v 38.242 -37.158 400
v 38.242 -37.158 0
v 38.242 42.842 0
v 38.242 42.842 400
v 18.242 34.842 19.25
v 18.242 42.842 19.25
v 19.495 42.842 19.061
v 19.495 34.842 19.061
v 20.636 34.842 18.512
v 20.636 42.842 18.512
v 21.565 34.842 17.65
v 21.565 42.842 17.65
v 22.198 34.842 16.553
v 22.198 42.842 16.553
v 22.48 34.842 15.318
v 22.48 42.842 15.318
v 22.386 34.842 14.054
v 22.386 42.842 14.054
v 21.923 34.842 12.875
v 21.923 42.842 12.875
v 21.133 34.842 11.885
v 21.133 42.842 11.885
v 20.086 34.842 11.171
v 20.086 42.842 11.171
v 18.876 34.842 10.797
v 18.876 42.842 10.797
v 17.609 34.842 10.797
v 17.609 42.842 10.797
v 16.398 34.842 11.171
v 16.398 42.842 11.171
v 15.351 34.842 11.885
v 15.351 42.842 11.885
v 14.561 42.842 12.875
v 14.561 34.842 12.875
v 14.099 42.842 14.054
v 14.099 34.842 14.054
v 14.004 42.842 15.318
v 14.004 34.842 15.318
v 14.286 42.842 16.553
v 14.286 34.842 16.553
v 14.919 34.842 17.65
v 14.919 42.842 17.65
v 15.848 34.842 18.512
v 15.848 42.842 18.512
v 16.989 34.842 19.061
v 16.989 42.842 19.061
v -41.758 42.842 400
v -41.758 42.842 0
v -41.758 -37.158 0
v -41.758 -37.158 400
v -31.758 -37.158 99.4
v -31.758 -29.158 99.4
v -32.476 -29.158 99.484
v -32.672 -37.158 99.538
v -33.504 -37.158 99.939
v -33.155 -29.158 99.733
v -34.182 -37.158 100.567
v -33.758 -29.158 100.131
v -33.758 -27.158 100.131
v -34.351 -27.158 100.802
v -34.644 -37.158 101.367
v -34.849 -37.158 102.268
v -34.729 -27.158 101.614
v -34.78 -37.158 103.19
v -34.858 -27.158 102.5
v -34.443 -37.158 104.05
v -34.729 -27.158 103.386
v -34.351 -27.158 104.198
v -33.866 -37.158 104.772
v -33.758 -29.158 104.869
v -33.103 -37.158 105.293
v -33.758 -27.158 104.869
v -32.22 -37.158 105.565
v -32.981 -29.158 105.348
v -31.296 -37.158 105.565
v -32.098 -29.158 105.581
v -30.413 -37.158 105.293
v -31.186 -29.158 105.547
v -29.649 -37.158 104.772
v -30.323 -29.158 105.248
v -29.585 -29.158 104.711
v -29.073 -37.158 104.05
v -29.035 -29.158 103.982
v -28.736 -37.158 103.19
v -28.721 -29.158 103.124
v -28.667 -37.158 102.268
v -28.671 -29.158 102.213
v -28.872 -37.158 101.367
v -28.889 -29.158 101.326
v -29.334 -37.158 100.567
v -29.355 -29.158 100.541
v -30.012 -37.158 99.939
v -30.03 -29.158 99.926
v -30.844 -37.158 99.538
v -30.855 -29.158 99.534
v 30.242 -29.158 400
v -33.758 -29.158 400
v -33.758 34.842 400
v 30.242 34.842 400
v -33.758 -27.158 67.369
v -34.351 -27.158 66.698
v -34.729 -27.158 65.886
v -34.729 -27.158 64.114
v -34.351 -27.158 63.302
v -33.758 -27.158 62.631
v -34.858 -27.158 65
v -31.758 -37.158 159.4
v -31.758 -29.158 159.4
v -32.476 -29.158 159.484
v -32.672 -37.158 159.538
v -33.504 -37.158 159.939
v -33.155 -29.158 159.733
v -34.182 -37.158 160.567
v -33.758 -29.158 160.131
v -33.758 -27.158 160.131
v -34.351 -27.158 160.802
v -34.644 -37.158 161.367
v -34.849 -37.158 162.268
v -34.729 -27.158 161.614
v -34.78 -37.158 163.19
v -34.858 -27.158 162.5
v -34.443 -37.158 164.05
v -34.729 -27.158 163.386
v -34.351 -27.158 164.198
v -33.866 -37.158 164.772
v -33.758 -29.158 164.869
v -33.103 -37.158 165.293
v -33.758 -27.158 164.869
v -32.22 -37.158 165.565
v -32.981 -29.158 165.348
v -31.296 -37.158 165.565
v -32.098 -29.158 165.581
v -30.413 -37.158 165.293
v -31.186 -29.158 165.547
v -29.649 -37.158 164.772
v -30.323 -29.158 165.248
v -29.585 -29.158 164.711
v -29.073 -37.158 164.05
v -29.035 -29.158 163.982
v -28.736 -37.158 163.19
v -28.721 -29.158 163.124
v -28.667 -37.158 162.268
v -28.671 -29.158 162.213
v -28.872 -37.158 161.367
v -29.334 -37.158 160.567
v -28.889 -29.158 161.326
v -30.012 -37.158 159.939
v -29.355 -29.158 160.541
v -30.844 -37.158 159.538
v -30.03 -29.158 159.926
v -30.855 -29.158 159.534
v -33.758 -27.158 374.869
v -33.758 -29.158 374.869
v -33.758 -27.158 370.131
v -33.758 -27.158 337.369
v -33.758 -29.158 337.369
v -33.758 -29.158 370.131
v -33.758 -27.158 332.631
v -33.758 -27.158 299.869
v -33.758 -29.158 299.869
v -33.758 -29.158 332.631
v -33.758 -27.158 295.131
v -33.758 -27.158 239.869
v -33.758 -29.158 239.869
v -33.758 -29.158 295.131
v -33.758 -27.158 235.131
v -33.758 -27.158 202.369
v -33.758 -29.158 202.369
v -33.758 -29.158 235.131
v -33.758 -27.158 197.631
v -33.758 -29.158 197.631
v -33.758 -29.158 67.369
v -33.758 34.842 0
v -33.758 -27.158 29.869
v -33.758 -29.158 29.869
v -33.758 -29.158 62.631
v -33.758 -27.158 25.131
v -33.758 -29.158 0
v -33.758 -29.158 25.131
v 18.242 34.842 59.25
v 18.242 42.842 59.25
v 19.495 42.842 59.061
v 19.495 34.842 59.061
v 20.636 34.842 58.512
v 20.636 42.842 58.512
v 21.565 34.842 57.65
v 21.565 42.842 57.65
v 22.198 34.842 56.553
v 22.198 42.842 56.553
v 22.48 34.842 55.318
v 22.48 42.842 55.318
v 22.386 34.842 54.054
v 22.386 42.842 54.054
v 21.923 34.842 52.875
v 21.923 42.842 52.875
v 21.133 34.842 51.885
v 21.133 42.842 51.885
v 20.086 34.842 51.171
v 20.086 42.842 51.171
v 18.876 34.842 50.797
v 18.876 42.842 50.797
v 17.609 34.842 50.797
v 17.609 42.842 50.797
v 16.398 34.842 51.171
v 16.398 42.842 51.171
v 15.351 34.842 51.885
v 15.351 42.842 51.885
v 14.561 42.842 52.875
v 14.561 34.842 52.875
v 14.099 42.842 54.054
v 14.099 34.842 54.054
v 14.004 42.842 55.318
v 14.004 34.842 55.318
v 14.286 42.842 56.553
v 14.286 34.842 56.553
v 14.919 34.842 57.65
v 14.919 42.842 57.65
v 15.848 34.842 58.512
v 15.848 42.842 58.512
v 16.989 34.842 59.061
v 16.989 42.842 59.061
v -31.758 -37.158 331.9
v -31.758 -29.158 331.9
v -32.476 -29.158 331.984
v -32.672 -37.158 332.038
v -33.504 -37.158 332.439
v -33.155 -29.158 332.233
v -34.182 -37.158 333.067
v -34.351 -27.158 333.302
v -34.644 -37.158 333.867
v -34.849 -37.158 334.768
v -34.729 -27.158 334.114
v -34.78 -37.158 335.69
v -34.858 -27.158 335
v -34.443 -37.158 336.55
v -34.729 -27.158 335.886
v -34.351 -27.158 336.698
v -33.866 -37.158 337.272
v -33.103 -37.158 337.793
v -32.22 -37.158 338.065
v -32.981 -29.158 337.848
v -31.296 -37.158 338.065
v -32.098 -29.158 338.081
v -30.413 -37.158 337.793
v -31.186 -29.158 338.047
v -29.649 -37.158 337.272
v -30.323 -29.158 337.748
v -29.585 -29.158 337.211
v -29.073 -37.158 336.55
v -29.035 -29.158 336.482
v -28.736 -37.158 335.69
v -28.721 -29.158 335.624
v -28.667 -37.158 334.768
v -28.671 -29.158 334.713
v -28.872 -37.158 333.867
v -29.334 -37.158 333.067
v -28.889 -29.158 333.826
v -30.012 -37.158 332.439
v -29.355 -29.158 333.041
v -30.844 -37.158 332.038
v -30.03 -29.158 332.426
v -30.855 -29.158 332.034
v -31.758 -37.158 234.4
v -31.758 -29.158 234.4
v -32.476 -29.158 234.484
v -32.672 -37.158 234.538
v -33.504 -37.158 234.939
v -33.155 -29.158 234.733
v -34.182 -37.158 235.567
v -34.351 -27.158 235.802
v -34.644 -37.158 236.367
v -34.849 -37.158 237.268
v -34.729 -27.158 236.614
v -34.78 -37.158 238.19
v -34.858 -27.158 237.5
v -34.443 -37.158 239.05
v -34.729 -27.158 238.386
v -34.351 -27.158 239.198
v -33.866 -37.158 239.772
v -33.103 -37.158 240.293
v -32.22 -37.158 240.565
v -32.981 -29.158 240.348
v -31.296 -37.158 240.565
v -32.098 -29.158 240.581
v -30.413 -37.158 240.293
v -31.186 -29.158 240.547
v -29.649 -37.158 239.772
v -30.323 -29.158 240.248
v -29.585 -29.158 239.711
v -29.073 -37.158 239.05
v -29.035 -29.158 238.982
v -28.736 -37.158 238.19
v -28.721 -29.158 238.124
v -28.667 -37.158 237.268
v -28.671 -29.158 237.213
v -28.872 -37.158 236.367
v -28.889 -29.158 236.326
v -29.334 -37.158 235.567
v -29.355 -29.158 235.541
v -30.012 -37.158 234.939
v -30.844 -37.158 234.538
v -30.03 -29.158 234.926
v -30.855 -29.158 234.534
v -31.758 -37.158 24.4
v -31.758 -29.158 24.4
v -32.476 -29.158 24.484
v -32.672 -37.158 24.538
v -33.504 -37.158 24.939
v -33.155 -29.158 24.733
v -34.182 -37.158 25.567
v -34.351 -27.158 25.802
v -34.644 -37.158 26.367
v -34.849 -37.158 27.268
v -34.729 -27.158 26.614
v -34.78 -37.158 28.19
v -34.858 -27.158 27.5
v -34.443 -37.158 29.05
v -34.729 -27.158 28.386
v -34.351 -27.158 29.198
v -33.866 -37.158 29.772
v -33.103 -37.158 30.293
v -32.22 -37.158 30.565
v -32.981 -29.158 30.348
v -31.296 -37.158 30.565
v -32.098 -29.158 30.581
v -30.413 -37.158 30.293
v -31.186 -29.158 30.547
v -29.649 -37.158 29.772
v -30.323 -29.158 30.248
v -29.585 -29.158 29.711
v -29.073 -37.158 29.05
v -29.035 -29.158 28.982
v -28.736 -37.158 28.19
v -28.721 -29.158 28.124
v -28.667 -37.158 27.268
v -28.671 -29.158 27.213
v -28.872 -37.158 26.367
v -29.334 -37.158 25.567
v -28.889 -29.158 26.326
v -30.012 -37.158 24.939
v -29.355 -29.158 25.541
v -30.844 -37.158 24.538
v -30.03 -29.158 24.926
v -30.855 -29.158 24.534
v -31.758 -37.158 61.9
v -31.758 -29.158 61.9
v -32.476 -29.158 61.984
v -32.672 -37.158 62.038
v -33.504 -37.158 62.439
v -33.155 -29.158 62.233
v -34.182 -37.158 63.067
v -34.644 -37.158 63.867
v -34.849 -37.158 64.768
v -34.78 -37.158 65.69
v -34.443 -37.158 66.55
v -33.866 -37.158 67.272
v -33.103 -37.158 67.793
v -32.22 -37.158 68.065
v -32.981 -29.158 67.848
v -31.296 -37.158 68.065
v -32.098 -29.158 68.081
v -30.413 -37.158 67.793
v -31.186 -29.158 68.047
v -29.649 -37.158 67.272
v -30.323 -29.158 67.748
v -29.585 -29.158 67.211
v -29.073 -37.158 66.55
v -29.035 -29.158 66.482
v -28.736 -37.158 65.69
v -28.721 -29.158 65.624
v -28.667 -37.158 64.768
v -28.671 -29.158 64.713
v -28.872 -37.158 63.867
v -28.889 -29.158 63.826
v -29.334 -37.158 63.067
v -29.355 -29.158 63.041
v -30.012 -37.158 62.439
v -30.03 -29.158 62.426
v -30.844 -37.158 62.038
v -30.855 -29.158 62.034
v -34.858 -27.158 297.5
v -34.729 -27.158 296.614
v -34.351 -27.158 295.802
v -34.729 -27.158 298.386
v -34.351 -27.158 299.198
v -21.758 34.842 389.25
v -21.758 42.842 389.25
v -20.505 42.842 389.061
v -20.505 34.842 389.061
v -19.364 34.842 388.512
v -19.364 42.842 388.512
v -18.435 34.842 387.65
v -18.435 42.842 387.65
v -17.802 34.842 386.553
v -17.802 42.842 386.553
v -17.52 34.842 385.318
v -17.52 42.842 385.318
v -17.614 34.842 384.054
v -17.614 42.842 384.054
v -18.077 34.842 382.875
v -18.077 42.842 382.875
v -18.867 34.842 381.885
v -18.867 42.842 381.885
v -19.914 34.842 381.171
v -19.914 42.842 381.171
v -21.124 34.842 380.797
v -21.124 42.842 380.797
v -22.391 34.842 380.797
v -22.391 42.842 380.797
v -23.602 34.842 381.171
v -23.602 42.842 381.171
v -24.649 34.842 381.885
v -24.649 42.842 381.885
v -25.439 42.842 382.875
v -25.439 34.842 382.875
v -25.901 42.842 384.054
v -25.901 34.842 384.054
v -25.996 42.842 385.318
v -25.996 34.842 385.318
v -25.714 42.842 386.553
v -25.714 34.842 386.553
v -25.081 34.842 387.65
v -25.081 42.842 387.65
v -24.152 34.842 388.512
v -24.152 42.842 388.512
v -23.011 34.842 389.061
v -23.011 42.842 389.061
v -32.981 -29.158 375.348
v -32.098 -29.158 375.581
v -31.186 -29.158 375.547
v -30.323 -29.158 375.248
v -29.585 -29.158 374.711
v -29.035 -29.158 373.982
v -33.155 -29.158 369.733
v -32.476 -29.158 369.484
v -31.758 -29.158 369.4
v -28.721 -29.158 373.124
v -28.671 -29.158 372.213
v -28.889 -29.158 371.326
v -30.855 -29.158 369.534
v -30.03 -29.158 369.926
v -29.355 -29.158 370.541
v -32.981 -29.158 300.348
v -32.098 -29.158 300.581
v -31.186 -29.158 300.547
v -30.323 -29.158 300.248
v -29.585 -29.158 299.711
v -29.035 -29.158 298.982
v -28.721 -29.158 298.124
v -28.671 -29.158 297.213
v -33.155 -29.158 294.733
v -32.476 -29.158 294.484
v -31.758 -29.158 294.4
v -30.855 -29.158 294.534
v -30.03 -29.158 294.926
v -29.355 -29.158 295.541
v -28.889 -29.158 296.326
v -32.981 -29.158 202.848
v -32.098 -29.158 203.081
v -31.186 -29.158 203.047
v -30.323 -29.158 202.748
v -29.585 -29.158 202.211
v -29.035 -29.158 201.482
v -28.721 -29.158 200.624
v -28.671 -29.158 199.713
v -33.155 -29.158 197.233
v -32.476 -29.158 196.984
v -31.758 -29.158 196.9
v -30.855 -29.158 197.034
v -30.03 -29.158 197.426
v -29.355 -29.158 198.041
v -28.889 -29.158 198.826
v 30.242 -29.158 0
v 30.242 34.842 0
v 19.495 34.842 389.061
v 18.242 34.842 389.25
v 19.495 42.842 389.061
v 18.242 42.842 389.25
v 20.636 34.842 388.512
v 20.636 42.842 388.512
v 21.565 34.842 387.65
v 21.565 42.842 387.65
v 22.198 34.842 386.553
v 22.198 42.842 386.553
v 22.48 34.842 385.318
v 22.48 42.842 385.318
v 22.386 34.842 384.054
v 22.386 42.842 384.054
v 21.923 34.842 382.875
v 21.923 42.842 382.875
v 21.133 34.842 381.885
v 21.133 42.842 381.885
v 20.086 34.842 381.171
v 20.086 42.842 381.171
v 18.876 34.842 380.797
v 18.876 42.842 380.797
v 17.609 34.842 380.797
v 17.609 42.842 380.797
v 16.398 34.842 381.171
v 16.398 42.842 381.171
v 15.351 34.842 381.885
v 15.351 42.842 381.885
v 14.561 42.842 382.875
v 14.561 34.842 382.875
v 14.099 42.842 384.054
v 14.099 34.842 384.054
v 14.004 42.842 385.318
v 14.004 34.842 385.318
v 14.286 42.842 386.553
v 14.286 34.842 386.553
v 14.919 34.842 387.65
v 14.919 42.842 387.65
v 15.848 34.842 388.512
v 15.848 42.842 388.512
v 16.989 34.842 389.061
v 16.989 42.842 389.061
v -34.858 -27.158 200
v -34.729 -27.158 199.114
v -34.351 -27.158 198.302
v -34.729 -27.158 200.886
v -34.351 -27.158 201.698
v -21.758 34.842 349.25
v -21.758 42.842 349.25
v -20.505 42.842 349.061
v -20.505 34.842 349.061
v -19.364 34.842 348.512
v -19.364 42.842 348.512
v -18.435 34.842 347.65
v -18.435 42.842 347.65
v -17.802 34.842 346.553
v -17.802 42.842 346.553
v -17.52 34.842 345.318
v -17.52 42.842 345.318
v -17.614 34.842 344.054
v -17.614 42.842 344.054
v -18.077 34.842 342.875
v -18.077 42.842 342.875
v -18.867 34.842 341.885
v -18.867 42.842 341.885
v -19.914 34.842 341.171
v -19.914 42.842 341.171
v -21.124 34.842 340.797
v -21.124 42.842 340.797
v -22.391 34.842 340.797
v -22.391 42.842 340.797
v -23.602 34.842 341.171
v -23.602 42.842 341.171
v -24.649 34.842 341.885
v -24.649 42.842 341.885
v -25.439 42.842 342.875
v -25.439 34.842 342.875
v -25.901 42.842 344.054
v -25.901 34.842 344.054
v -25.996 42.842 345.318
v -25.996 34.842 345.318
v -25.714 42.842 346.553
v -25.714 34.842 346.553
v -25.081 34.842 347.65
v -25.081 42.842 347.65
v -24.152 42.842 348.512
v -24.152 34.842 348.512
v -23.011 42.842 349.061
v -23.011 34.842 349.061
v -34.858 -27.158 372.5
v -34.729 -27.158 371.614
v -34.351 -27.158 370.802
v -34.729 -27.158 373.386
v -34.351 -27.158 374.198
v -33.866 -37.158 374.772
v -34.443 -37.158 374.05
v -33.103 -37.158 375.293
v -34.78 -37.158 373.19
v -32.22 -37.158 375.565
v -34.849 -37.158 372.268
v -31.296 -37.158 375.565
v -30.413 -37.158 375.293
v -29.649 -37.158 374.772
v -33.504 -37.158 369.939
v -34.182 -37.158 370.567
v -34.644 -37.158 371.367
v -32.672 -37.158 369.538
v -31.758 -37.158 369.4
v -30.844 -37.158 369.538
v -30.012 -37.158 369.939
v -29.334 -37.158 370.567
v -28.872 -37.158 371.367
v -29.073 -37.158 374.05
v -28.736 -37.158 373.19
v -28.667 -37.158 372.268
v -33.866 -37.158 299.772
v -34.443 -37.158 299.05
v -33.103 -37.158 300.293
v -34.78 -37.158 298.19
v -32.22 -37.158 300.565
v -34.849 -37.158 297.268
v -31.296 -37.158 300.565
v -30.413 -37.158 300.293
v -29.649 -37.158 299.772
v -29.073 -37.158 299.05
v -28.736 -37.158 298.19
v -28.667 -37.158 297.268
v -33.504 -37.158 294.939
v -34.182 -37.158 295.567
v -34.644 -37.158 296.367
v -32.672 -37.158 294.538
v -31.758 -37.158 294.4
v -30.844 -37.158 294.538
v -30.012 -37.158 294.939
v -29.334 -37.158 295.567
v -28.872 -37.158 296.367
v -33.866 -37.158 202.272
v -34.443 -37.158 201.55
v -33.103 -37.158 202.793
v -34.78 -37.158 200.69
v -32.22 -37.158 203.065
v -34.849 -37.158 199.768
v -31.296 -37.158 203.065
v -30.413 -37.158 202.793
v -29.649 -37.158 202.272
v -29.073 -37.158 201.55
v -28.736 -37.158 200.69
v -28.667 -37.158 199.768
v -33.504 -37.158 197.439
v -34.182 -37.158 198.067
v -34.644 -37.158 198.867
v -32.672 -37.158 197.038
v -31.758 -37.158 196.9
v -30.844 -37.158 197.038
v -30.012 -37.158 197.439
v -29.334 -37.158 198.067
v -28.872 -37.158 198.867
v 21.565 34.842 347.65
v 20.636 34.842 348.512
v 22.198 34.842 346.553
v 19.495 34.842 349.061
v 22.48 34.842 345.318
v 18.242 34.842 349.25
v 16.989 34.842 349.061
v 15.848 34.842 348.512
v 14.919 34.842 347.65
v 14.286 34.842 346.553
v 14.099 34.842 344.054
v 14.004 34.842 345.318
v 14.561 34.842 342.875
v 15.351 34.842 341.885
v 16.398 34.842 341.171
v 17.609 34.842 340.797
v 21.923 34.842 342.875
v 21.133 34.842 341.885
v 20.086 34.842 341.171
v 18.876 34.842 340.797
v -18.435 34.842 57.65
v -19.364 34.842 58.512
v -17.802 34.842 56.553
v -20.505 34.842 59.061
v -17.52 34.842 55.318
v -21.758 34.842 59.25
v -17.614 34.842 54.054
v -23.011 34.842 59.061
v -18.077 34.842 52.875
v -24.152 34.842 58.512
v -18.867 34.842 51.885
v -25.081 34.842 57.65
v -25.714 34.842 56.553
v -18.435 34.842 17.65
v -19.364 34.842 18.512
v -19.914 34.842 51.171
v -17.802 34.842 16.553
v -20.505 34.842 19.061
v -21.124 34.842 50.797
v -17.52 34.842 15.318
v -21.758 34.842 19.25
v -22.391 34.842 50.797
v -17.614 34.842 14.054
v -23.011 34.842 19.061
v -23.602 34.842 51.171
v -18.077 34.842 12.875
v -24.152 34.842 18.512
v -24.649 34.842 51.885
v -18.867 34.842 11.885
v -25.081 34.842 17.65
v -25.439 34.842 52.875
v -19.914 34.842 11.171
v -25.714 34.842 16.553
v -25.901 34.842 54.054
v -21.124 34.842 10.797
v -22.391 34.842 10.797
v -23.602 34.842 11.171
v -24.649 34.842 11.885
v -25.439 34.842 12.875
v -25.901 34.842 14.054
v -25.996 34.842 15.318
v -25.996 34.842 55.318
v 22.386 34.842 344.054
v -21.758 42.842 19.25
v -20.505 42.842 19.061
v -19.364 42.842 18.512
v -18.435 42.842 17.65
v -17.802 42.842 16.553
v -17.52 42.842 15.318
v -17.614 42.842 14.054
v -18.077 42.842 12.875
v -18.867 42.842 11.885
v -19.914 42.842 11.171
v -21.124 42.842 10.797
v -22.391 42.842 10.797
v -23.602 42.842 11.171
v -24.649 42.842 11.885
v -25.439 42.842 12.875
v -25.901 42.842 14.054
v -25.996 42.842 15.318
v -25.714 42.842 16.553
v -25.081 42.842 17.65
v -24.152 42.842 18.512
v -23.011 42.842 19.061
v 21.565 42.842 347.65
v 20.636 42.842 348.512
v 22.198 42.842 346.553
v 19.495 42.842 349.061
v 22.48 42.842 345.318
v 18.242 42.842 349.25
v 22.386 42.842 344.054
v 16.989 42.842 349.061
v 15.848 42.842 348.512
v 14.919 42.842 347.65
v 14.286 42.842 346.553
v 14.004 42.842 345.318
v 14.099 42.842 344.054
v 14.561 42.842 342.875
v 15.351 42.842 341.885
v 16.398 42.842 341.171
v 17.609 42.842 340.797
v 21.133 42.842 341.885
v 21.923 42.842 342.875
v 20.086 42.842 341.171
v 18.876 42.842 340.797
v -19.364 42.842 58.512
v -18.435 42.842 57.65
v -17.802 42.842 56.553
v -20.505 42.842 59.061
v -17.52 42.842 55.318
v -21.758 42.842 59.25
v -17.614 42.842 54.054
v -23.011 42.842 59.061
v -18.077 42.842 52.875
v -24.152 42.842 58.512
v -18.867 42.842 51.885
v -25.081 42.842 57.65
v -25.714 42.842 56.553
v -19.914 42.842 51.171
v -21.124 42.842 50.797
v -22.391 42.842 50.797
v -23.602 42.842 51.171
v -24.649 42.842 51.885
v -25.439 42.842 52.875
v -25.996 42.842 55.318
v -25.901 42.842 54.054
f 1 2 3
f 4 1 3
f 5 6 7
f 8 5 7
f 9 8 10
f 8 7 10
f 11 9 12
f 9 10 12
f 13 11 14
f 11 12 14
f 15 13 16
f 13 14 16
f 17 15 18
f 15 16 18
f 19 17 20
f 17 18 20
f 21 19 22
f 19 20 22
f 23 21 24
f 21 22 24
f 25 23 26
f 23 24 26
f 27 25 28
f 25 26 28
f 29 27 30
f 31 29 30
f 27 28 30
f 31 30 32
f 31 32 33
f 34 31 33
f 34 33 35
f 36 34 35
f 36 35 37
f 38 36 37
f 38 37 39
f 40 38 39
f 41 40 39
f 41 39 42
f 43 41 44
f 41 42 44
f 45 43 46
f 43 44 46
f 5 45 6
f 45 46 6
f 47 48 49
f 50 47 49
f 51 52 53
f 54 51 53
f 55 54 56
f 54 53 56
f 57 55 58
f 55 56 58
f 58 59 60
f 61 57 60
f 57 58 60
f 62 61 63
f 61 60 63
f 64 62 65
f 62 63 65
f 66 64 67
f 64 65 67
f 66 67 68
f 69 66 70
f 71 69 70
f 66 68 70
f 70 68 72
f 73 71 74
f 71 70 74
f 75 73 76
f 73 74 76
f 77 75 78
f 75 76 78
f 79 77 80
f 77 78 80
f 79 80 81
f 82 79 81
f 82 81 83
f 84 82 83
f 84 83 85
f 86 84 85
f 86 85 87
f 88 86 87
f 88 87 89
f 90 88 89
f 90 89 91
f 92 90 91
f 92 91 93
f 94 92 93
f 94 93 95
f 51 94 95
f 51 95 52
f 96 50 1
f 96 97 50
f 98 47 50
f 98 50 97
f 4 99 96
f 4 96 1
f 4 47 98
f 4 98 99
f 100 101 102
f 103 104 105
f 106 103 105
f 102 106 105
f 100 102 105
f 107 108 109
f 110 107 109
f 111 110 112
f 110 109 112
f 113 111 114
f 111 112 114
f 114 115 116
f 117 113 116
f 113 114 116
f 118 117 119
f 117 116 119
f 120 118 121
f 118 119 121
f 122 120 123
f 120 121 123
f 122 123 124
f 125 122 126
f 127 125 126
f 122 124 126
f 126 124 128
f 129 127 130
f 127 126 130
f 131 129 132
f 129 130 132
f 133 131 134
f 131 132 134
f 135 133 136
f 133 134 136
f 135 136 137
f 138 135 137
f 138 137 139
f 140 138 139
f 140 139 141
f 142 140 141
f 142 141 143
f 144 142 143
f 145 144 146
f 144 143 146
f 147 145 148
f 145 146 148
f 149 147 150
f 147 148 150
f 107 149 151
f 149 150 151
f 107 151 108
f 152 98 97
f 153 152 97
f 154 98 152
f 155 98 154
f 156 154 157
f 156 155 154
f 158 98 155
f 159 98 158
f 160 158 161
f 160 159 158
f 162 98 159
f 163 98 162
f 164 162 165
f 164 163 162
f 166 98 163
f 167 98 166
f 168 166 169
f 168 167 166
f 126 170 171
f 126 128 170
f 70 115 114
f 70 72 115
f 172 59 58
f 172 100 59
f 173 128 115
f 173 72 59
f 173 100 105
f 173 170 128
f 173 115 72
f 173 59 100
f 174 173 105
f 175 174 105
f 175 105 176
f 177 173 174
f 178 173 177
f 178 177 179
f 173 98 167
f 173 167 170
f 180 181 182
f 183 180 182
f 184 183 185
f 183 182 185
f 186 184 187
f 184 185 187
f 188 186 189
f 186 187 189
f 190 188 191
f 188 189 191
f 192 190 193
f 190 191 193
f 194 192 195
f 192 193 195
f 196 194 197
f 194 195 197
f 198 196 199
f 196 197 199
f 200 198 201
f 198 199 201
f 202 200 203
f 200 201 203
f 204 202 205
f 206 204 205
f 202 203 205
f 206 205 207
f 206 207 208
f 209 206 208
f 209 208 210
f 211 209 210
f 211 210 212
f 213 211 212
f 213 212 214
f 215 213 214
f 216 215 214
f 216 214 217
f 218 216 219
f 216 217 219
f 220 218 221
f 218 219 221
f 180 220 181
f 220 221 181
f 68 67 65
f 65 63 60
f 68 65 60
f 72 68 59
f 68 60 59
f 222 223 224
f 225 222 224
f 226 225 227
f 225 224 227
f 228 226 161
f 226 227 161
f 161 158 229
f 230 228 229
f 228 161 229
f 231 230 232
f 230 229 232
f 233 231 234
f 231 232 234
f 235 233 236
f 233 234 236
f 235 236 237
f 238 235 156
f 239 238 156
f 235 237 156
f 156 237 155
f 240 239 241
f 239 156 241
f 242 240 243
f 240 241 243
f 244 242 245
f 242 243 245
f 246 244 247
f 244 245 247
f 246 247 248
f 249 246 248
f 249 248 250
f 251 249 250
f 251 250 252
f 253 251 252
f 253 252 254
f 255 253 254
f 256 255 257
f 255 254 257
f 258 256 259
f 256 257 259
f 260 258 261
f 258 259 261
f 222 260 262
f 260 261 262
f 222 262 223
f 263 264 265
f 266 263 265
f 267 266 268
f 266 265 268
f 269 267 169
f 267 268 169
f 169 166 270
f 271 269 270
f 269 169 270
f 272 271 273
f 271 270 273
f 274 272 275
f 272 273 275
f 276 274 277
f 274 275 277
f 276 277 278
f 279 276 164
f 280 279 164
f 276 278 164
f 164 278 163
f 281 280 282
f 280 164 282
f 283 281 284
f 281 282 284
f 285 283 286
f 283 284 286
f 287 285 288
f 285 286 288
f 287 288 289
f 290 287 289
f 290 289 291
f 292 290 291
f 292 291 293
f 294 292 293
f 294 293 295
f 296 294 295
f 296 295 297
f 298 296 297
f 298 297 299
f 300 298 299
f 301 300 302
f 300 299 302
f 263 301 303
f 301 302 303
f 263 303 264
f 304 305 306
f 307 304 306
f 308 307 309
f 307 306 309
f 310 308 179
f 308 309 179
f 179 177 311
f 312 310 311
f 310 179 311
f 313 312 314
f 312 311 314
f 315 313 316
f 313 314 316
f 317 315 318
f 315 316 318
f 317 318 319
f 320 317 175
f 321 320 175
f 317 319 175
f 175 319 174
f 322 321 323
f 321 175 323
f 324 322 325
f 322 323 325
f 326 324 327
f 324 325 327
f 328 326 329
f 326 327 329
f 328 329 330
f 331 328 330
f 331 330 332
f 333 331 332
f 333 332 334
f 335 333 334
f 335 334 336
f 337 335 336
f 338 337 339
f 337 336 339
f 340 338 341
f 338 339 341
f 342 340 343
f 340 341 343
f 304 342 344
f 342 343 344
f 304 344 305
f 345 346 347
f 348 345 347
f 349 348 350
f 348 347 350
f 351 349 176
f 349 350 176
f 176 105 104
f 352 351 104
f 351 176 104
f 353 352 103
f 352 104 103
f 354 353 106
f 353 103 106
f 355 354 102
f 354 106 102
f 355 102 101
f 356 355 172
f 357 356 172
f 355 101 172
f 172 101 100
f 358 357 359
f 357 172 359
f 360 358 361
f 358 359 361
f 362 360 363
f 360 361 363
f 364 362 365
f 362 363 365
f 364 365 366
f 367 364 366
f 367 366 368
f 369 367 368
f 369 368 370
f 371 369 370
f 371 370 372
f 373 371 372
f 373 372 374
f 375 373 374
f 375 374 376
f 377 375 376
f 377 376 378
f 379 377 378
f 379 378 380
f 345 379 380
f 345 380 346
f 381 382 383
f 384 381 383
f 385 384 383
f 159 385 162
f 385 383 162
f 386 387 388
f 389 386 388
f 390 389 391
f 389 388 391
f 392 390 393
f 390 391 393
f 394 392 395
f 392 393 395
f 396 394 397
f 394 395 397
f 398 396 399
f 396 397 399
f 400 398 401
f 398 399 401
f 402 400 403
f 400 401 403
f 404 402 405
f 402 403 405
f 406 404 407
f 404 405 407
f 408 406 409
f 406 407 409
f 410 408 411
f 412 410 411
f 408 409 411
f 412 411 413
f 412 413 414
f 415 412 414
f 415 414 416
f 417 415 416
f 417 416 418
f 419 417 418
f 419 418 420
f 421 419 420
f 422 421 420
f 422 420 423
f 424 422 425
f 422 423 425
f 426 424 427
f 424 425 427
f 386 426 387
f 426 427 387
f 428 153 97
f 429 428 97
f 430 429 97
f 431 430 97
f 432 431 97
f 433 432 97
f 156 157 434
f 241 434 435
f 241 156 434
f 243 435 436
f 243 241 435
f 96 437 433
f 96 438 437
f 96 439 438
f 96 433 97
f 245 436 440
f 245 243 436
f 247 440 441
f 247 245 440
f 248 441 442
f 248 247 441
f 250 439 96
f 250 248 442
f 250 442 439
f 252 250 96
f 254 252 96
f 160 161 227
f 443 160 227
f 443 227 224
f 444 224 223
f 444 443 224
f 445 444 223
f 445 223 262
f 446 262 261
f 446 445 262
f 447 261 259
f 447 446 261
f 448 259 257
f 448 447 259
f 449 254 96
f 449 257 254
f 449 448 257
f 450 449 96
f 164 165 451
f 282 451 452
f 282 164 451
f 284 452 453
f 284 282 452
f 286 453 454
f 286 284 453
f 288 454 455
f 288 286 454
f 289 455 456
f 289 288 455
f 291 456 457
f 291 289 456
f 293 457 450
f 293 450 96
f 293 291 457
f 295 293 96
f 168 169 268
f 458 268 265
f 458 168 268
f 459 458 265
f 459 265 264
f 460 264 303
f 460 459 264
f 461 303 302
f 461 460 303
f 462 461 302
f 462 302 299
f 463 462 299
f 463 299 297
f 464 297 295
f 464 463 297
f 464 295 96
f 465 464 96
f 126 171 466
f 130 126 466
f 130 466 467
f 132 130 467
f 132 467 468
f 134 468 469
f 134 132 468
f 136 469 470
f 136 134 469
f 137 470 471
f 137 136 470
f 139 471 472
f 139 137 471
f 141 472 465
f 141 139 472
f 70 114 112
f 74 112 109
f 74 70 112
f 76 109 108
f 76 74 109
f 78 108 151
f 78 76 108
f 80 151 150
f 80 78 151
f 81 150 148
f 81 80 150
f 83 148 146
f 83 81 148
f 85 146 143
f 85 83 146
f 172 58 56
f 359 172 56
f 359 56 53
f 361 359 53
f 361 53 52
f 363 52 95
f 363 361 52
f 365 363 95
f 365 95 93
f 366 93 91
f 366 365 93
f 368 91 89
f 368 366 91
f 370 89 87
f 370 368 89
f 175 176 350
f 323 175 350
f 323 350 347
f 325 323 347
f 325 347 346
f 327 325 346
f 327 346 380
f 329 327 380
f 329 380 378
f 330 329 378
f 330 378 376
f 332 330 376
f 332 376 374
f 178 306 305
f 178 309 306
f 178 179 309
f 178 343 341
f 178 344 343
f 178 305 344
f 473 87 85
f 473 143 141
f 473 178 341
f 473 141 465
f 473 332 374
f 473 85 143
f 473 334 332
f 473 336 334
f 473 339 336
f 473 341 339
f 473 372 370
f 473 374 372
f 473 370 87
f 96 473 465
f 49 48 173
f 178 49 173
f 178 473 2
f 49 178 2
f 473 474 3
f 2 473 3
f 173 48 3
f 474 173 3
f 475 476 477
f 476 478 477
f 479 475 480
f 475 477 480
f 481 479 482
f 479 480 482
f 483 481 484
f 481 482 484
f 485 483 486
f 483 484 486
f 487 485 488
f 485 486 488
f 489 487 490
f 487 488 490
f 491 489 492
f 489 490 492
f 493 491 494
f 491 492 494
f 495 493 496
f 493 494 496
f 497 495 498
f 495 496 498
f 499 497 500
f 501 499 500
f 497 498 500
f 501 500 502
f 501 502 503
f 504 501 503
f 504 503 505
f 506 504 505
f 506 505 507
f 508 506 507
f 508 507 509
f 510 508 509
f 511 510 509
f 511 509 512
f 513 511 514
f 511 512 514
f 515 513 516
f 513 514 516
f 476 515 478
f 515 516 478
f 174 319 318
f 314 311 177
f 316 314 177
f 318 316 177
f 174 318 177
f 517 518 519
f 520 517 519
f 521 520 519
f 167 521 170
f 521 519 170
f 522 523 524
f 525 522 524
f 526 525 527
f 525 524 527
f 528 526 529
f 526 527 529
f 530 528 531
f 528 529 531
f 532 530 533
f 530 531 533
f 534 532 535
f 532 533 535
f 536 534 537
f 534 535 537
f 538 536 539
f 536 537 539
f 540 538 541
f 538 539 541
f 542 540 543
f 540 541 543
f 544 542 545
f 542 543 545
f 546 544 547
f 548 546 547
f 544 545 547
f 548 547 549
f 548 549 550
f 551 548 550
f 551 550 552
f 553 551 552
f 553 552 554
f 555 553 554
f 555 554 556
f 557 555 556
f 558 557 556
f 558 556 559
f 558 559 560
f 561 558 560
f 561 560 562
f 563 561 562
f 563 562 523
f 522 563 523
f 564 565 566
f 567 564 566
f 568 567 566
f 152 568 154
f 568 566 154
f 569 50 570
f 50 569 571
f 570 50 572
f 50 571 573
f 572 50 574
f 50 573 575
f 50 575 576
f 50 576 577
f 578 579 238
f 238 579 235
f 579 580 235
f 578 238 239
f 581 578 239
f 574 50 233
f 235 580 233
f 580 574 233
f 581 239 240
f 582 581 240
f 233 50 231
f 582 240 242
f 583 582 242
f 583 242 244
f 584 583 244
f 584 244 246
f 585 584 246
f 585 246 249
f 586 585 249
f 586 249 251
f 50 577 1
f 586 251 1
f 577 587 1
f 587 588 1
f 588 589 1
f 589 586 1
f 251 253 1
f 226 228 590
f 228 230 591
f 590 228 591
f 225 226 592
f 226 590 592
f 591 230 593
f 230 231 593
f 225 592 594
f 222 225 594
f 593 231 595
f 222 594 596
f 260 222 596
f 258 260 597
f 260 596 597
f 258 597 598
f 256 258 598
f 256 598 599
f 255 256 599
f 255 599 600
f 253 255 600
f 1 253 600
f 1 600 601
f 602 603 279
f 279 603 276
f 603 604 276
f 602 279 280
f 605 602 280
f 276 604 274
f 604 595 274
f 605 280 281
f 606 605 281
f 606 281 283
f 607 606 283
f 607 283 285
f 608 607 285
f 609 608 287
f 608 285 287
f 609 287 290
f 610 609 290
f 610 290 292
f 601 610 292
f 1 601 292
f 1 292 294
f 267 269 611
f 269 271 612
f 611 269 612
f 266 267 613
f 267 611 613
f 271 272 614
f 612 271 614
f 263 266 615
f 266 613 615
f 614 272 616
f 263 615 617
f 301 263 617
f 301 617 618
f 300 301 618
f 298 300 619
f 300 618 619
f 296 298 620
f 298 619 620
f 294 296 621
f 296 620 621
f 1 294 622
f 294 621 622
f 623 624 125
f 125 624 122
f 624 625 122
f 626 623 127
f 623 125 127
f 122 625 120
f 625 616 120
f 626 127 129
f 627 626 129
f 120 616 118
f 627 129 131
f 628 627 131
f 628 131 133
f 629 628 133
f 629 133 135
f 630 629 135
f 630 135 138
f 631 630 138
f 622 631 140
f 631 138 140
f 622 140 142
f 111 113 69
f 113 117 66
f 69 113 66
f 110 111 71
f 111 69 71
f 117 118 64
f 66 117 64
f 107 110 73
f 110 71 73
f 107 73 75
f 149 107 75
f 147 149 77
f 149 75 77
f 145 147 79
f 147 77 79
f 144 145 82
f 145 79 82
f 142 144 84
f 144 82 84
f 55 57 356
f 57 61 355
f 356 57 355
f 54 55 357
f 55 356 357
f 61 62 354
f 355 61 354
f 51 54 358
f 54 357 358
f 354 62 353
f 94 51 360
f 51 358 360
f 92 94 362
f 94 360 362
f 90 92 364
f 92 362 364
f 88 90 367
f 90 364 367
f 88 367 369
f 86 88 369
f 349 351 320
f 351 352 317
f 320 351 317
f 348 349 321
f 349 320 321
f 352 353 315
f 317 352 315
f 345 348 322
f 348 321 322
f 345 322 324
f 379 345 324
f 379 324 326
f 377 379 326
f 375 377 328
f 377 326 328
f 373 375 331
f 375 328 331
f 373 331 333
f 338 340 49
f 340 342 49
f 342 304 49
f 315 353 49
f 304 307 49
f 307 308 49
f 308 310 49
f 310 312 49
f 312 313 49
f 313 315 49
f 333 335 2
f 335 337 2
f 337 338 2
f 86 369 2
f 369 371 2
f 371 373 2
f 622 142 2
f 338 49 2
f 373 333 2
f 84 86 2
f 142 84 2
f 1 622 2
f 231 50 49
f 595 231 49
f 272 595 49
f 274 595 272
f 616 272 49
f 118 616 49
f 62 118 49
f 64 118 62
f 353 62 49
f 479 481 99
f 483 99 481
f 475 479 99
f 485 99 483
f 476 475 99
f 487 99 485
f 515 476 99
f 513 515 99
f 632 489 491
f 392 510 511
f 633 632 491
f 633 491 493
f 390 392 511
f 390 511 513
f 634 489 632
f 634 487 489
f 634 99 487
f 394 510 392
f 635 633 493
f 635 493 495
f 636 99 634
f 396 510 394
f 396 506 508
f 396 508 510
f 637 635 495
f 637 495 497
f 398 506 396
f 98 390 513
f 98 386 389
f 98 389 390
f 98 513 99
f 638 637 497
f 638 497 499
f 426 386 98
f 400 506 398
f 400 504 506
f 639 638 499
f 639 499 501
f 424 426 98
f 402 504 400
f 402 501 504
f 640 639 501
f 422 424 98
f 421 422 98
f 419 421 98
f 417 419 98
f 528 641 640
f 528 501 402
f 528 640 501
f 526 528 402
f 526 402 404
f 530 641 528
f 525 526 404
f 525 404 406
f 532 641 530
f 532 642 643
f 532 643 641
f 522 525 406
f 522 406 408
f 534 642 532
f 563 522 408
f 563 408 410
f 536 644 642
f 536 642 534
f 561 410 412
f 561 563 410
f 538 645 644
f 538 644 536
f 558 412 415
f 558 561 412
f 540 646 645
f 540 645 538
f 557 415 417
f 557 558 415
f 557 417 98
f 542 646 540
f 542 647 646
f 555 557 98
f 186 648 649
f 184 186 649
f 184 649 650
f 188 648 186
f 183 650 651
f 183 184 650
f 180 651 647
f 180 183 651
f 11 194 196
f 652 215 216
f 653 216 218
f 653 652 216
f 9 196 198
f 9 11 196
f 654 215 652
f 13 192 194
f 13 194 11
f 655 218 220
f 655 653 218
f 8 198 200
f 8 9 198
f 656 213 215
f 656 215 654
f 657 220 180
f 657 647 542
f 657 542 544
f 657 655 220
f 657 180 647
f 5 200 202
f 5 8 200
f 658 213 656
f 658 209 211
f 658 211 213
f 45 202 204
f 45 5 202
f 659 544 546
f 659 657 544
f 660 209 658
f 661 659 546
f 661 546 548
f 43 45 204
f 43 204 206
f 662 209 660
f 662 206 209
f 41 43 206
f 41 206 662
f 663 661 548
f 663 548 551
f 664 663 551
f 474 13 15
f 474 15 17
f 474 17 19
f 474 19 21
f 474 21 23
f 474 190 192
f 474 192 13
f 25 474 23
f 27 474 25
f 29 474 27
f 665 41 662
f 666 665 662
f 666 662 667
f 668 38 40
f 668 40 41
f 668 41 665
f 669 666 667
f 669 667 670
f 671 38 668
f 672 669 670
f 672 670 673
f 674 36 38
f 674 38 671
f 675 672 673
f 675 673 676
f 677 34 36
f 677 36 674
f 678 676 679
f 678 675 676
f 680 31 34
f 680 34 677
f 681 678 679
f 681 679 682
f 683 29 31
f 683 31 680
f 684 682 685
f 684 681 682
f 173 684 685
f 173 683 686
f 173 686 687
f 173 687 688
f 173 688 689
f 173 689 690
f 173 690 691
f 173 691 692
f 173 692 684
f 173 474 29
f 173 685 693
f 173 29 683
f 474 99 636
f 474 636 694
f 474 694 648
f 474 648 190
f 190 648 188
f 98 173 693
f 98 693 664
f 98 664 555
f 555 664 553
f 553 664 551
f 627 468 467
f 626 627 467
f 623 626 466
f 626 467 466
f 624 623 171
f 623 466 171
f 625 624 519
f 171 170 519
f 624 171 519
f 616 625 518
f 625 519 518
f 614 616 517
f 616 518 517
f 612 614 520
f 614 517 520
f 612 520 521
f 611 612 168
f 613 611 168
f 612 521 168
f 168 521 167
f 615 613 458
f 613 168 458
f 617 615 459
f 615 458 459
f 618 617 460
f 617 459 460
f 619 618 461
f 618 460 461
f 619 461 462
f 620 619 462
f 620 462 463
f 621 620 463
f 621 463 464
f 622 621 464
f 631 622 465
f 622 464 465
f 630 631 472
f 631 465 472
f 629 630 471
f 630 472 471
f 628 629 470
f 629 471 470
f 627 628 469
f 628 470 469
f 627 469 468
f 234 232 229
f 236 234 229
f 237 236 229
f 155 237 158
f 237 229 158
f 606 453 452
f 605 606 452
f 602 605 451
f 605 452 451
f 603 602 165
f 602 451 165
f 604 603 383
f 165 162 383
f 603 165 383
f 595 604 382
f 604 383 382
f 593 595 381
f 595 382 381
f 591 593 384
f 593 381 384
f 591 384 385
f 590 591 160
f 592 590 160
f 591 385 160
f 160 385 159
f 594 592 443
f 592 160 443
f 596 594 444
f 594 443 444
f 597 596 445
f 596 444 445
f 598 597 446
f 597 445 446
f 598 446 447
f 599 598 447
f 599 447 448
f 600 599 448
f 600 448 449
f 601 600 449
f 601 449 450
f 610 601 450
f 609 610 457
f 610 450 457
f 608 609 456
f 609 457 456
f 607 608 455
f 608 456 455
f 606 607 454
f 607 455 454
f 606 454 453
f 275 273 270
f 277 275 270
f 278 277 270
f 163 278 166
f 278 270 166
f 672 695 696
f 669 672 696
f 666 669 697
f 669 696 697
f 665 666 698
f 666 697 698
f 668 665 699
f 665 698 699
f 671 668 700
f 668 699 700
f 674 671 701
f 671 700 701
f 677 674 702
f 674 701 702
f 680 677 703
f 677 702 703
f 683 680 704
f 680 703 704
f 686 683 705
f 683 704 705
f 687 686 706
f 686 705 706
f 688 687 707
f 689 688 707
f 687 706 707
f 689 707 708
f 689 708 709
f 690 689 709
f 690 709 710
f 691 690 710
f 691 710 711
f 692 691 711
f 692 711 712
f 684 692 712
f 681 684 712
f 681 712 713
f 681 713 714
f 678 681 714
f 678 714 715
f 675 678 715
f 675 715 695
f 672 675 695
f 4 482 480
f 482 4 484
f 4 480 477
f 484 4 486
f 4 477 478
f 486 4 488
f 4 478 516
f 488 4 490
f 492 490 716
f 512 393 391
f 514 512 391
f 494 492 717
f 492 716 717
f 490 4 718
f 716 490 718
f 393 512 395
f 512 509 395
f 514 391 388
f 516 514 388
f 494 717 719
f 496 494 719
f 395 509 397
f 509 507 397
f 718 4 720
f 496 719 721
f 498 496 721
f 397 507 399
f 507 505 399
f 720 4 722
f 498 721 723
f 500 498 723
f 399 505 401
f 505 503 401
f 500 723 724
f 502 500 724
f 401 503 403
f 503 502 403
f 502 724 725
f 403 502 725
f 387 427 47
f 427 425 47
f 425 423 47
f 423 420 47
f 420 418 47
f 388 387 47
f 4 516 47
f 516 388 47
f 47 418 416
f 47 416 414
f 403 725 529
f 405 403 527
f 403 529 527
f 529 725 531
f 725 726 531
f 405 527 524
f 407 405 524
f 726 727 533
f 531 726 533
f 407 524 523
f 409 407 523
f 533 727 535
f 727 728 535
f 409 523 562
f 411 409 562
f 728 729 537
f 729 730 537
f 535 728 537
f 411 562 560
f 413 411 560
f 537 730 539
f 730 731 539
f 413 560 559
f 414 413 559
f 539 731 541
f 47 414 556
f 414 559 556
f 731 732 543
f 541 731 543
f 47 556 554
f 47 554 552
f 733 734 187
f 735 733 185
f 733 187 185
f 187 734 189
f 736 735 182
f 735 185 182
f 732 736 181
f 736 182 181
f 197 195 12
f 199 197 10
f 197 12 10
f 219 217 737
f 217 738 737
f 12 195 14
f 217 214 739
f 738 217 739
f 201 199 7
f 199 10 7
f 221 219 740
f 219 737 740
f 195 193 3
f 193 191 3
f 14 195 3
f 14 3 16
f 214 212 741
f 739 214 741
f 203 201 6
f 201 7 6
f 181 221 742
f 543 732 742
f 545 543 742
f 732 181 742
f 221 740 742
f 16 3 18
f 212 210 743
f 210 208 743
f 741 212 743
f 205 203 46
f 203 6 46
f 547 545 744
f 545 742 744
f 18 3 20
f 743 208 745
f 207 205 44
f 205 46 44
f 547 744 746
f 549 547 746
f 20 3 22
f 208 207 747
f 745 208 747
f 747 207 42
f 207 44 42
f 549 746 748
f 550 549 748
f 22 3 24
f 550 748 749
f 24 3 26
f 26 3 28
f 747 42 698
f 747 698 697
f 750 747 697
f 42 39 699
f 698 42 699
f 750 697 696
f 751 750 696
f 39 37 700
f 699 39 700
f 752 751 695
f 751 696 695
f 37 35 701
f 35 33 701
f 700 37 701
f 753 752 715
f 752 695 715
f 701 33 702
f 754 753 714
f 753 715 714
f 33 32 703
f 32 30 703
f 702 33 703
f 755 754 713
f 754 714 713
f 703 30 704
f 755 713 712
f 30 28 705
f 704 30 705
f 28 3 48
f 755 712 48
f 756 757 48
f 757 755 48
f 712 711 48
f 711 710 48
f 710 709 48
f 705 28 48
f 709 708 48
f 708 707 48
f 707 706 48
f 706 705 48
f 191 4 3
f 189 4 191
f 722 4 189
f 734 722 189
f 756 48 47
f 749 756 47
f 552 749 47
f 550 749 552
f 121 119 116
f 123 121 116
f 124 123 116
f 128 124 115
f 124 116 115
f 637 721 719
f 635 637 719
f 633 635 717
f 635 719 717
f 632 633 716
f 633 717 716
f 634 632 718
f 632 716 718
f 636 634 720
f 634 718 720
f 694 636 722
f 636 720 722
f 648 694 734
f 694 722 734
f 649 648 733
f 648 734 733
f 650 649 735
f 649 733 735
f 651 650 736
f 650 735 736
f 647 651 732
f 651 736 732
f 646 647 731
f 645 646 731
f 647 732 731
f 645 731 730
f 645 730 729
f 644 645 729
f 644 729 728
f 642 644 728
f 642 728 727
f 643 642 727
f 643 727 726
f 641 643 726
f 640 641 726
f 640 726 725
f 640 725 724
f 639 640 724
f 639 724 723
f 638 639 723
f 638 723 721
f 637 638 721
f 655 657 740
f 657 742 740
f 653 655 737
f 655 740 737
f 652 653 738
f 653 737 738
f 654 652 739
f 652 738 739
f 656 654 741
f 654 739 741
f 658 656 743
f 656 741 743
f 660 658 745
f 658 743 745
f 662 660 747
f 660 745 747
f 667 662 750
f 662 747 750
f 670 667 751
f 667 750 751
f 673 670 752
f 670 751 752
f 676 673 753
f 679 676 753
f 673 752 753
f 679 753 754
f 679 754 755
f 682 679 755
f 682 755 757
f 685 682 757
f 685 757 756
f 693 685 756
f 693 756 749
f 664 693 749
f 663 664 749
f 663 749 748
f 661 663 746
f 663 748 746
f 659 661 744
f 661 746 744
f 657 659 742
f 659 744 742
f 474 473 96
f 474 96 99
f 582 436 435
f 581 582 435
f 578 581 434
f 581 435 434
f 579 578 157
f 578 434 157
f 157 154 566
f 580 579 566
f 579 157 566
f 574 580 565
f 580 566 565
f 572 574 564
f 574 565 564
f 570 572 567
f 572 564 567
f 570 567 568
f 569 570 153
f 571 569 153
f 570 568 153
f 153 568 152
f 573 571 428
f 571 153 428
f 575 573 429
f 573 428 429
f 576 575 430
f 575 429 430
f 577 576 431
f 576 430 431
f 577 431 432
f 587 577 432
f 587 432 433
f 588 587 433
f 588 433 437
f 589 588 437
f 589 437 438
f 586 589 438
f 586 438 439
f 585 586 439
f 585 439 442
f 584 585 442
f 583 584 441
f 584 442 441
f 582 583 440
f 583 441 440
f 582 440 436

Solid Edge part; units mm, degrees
sketch "Sketch1" plane through (0, 0, 0) normal (0, 0, 1) x (1, 0, 0)
  line L0 (-33.7579, 34.8421) -> (-33.7579, -29.1579)
  line L1 (-33.7579, -29.1579) -> (30.2421, -29.1579)
  line L2 (30.2421, -29.1579) -> (30.2421, 34.8421)
  line L3 (30.2421, 34.8421) -> (-33.7579, 34.8421)
  line L4 (-41.7579, 42.8421) -> (-41.7579, -37.1579)
  line L5 (-41.7579, -37.1579) -> (38.2421, -37.1579)
  line L6 (38.2421, -37.1579) -> (38.2421, 42.8421)
  line L7 (38.2421, 42.8421) -> (-41.7579, 42.8421)
  dimension "D1" = 80
  dimension "D2" = 80
  dimension "D3" = 8
  dimension "D4" = 8
  dimension "D5" = 8
  dimension "D6" = 8
extrude "Protrusion1" add sketch "Sketch1" along normal blind 400
hole "Hole_10" at (-31.7579, -37.1579, 335) direction (0, 1, 0) diameter 6.2 depth 10
hole "Hole1" at (-31.7579, -37.1579, 297.5) direction (0, 1, 0) diameter 6.2 depth 10
hole "Hole2" at (-31.7579, -37.1579, 237.5) direction (0, 1, 0) diameter 6.2 depth 10
hole "Hole3" at (-31.7579, -37.1579, 200) direction (0, 1, 0) diameter 6.2 depth 10
hole "Hole4" at (-31.7579, -37.1579, 162.5) direction (0, 1, 0) diameter 6.2 depth 10
hole "Hole5" at (-31.7579, -37.1579, 102.5) direction (0, 1, 0) diameter 6.2 depth 10
hole "Hole6" at (-31.7579, -37.1579, 65) direction (0, 1, 0) diameter 6.2 depth 10
hole "Hole7" at (-31.7579, -37.1579, 27.5) direction (0, 1, 0) diameter 6.2 depth 10
hole "Hole8" at (-31.7579, -37.1579, 372.5) direction (0, 1, 0) diameter 6.2 depth 10
hole "Hole_19" at (-21.7579, 42.8421, 15) direction (0, -1, 0) diameter 8.5 end up to next
hole "Hole9" at (-21.7579, 42.8421, 55) direction (0, -1, 0) diameter 8.5 end up to next
hole "Hole10" at (18.2421, 42.8421, 55) direction (0, -1, 0) diameter 8.5 end up to next
hole "Hole11" at (18.2421, 42.8421, 345) direction (0, -1, 0) diameter 8.5 end up to next
hole "Hole12" at (18.2421, 42.8421, 385) direction (0, -1, 0) diameter 8.5 end up to next
hole "Hole13" at (-21.7579, 42.8421, 385) direction (0, -1, 0) diameter 8.5 end up to next
hole "Hole14" at (-21.7579, 42.8421, 345) direction (0, -1, 0) diameter 8.5 end up to next
hole "Hole15" at (18.2421, 42.8421, 15) direction (0, -1, 0) diameter 8.5 end up to next
